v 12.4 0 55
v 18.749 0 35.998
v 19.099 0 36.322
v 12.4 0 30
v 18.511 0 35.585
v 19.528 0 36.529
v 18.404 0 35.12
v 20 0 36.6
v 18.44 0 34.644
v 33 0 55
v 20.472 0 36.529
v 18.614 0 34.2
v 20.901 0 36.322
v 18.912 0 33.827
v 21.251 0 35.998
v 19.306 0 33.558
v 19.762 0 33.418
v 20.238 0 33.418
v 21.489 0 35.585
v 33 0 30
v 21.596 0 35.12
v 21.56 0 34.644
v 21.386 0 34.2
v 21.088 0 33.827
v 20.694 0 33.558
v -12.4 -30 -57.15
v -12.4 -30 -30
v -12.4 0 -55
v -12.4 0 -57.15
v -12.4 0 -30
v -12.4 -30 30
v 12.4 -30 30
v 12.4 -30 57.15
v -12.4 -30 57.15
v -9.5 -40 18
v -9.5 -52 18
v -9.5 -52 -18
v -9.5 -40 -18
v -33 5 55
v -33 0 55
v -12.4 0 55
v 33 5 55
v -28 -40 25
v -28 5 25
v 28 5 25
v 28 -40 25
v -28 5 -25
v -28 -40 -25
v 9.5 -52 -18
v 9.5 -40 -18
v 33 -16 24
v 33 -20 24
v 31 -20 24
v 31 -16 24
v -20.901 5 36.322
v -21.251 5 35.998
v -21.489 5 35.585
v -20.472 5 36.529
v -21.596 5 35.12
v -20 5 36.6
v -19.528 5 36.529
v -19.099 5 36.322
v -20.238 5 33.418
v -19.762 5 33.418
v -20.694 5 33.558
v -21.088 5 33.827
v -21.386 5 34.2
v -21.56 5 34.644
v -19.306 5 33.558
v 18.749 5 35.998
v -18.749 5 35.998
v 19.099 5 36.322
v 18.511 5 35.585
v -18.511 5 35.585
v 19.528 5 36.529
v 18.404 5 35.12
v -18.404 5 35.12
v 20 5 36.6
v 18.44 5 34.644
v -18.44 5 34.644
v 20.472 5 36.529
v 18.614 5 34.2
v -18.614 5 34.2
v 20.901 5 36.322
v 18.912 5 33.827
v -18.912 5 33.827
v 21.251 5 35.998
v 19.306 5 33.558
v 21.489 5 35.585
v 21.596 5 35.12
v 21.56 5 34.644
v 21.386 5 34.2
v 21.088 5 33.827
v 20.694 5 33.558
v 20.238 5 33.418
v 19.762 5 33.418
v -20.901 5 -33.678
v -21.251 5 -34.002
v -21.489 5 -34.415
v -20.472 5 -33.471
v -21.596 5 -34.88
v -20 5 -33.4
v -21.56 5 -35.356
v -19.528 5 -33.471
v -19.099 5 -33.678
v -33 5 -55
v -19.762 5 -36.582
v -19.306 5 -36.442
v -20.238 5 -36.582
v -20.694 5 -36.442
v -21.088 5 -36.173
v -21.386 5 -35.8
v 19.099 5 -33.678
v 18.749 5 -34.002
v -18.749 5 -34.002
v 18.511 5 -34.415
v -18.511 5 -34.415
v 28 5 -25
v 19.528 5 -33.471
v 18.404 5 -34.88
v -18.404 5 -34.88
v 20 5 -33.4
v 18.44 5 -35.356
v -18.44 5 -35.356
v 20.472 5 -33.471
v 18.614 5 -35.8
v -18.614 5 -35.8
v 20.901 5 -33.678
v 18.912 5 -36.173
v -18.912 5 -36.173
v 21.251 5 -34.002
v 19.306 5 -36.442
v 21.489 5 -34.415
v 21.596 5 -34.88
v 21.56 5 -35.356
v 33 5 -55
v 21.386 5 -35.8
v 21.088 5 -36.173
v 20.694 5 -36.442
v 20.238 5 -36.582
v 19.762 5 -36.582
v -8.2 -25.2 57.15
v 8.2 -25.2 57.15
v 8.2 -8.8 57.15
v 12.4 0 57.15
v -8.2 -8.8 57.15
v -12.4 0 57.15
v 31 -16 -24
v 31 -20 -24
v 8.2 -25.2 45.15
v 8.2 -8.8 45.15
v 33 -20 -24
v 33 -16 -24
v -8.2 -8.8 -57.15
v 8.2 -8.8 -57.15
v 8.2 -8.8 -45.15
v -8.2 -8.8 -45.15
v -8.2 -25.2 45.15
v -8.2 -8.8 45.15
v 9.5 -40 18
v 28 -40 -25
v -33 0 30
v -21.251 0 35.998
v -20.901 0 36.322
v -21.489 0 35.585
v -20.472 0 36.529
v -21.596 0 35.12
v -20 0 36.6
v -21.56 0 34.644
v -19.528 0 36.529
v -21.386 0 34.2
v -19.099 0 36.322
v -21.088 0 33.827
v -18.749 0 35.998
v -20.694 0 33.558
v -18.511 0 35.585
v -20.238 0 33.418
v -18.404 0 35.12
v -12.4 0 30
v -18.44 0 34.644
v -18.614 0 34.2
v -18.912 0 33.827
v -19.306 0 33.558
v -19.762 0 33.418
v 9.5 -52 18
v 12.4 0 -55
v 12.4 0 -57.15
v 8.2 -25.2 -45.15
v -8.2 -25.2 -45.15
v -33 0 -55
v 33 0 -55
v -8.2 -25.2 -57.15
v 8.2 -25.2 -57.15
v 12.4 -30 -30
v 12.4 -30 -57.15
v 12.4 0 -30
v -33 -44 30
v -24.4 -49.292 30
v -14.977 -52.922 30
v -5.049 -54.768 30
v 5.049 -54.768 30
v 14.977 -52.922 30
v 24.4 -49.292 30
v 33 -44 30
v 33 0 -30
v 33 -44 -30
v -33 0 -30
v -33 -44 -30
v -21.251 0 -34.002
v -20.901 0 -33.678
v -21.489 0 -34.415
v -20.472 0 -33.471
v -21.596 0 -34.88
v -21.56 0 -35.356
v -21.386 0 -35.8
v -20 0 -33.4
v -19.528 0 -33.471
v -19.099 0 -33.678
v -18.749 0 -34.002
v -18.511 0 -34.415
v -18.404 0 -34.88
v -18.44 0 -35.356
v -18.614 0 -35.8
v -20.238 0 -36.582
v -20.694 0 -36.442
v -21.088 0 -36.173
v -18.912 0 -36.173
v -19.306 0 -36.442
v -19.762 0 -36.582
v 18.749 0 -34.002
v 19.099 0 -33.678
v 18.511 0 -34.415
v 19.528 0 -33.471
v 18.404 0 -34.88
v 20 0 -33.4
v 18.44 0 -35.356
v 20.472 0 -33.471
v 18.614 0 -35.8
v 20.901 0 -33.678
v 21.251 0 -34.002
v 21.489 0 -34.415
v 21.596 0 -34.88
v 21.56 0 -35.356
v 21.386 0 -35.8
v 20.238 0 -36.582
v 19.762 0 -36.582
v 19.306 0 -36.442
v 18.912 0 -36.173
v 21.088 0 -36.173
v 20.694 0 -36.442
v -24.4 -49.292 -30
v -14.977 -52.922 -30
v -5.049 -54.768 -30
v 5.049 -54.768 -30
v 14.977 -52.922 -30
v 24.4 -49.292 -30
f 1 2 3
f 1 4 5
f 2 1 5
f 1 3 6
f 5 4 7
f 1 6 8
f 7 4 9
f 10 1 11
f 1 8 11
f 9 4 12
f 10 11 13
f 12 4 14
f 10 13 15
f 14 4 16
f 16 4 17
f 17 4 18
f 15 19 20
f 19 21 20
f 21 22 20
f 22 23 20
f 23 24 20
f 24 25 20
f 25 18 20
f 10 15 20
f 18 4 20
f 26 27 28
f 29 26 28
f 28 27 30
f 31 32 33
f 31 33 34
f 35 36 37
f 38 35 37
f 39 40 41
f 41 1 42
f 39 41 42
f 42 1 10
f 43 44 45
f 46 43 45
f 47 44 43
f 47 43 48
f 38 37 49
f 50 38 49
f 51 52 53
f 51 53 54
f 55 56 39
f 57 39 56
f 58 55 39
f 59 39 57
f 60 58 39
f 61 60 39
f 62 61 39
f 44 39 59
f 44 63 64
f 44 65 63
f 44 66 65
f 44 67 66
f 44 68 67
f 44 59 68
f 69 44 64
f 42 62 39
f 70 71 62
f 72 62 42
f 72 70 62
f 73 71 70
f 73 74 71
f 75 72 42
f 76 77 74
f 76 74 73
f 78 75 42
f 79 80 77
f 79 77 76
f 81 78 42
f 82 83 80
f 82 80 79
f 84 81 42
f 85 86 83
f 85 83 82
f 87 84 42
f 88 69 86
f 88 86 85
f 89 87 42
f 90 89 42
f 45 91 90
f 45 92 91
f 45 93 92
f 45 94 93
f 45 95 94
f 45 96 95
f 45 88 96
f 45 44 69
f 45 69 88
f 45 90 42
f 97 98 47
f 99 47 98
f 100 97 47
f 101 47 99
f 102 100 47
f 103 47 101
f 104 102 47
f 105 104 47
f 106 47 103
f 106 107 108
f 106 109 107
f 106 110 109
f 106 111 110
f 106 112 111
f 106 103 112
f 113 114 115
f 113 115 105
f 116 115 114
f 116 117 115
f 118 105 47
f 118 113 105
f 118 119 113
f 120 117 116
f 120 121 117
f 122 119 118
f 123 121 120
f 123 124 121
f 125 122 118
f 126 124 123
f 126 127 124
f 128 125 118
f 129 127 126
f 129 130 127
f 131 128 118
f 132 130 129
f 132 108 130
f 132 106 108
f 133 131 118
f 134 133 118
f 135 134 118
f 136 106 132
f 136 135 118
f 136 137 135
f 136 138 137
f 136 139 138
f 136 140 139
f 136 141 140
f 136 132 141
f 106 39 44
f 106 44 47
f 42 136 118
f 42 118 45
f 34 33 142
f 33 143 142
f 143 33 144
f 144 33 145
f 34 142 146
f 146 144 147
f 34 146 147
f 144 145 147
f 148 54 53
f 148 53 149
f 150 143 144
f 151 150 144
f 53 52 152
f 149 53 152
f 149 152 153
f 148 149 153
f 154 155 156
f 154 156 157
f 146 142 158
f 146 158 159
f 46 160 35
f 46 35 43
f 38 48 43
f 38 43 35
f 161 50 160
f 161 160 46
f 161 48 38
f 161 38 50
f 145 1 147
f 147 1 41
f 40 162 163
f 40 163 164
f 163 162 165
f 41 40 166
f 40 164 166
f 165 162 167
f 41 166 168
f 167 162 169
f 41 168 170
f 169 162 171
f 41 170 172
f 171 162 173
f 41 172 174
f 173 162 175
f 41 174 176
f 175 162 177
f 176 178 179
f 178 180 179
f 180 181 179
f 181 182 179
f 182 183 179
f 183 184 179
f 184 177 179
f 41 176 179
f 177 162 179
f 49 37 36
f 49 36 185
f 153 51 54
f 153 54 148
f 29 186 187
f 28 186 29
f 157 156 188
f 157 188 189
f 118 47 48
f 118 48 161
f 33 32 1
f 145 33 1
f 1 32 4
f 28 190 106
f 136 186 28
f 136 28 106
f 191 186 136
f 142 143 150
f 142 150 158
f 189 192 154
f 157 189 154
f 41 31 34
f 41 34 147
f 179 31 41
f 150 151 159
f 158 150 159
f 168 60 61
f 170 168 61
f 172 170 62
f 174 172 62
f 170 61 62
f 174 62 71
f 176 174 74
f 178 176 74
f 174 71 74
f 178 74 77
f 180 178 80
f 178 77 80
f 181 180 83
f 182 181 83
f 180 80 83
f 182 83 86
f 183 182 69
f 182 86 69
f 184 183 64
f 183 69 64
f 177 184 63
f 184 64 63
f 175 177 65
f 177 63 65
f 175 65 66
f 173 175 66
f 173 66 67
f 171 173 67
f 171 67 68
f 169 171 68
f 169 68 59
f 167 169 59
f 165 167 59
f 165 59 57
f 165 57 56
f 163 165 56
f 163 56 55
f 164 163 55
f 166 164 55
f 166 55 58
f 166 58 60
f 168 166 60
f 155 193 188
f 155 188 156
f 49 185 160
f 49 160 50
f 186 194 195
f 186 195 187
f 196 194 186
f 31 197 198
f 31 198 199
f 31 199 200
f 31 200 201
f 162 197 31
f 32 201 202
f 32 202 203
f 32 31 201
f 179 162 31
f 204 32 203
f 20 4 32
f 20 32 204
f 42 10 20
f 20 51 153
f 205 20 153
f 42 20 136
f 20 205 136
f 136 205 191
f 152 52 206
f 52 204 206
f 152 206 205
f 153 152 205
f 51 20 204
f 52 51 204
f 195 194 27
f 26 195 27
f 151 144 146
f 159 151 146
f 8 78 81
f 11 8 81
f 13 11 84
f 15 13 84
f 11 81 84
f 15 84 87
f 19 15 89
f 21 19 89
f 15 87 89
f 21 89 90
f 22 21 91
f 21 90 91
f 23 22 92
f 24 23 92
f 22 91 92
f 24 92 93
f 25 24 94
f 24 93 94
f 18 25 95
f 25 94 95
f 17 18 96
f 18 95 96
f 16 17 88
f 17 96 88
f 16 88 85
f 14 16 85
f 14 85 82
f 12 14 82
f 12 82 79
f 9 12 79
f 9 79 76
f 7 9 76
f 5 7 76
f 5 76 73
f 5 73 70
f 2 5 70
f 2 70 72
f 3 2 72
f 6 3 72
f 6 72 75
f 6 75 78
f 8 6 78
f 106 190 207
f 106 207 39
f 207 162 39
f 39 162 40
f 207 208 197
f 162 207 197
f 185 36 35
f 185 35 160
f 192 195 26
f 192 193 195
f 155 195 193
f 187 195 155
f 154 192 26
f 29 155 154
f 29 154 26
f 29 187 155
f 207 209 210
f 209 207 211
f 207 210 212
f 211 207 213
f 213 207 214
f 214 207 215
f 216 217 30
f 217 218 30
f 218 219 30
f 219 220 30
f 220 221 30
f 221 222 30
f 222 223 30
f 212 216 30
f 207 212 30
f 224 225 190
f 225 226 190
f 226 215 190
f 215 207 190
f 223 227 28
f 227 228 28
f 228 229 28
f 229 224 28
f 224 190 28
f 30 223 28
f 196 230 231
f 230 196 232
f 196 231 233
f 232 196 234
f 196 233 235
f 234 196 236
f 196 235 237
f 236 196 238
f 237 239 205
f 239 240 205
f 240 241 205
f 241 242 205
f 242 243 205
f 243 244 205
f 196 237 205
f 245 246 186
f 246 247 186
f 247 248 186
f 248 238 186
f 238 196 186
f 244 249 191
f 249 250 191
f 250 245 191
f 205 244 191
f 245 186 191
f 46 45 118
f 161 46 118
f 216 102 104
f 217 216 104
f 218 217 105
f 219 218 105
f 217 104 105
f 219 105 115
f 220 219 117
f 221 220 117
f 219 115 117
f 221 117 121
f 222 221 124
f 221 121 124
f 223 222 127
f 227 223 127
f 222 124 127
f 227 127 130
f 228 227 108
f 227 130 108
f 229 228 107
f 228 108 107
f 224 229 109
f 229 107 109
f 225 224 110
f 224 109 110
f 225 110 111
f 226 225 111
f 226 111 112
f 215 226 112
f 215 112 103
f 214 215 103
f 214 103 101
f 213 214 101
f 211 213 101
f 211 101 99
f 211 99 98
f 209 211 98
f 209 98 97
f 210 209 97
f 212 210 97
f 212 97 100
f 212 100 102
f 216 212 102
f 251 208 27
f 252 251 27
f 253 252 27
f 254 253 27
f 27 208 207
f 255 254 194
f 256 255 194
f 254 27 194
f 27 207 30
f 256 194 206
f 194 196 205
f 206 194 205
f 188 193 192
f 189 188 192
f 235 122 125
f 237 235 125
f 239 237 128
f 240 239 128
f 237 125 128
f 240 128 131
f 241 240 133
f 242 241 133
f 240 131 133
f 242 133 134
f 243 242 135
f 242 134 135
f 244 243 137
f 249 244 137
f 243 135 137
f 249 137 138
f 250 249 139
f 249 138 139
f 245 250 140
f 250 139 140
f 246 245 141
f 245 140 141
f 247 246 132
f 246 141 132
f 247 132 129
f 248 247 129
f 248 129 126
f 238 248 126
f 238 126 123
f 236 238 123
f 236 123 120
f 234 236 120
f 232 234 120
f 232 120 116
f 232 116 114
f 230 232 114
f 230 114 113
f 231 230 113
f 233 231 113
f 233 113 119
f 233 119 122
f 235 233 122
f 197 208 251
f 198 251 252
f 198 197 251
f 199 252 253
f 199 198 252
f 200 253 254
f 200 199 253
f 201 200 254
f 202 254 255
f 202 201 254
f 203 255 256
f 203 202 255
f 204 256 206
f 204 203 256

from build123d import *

# Parameters (mm, degrees)
BOSS_EXTRUDE1_DEPTH      = 30
BOSS_EXTRUDE1_DEPTH_BACK = 30
CUT_EXTRUDE1_DEPTH       = 18
CUT_EXTRUDE1_DEPTH_BACK  = 18
SKETCH2_W                = 19
SKETCH2_H                = 52
SKETCH3_W                = 21.854352608
SKETCH3_H                = 45
CUT_EXTRUDE2_DEPTH       = 99.234413522
SKETCH4_R                = 1.6
CUT_EXTRUDE3_DEPTH       = 84.366660003
SKETCH6_W                = 48
SKETCH6_H                = 4
CUT_EXTRUDE5_DEPTH       = 2
SKETCH9_W                = 22
SKETCH9_H                = 60
CUT_EXTRUDE7_DEPTH       = 84.366660003
SKETCH10_W               = 66
SKETCH10_H               = 110
SKETCH10_W_2             = 19
SKETCH10_H_2             = 36
BOSS_EXTRUDE2_DEPTH      = 5
SKETCH11_R               = 1.6
CUT_EXTRUDE8_DEPTH       = 88.82938005
SKETCH13_W               = 24.8
SKETCH13_H               = 30
BOSS_EXTRUDE3_DEPTH      = 27.15
SKETCH14_W               = 16.4
SKETCH14_H               = 16.4
CUT_EXTRUDE9_DEPTH       = 12
SKETCH15_W               = 56
SKETCH15_H               = 50
CUT_EXTRUDE10_DEPTH      = 45


with BuildPart() as part:
    # Sketch1 → Boss-Extrude1 (new, two sides: drawn at the far end of the back side and taken through both)
    with BuildSketch(Plane.XY.offset(-BOSS_EXTRUDE1_DEPTH_BACK)):
        with BuildLine():
            Line((55, 0), (0, 0))
            Line((0, 0), (-55, 0))
            ThreePointArc((-55, 0), (0, -55), (55, 0))
        make_face()
    extrude(amount=BOSS_EXTRUDE1_DEPTH + BOSS_EXTRUDE1_DEPTH_BACK)

    # Sketch2 → Cut-Extrude1 (cut, two sides: drawn at the far end of the back side and taken through both)
    with BuildSketch(Plane.XY.offset(-CUT_EXTRUDE1_DEPTH_BACK)):
        with Locations((0, -26)):
            Rectangle(SKETCH2_W, SKETCH2_H)
    extrude(amount=CUT_EXTRUDE1_DEPTH + CUT_EXTRUDE1_DEPTH_BACK, mode=Mode.SUBTRACT)

    # Sketch3 → Cut-Extrude2 (cut, through all)
    with BuildSketch(Plane.XY.offset(30)):
        with Locations((-43.927176304, -26.5)):
            Rectangle(SKETCH3_W, SKETCH3_H)
        with Locations((43.927176304, -26.5)):
            Rectangle(SKETCH3_W, SKETCH3_H)
    extrude(amount=-CUT_EXTRUDE2_DEPTH, mode=Mode.SUBTRACT)

    # Sketch4 → Cut-Extrude3 (cut, through all)
    with BuildSketch(Plane(origin=(0, 0, 0), x_dir=(1, 0, 0), z_dir=(0, 1, 0))):
        with Locations((45, 20)):
            Circle(SKETCH4_R)
        with Locations((45, -20)):
            Circle(SKETCH4_R)
        with Locations((-45, -20)):
            Circle(SKETCH4_R)
        with Locations((-45, 20)):
            Circle(SKETCH4_R)
    extrude(amount=-CUT_EXTRUDE3_DEPTH, mode=Mode.SUBTRACT)

    # Sketch6 → Cut-Extrude5 (cut)
    with BuildSketch(Plane(origin=(33, 0, 0), x_dir=(0, 0, -1), z_dir=(1, 0, 0))):
        with Locations((0, -18)):
            Rectangle(SKETCH6_W, SKETCH6_H)
    extrude(amount=-CUT_EXTRUDE5_DEPTH, mode=Mode.SUBTRACT)

    # Sketch9 → Cut-Extrude7 (cut, through all)
    with BuildSketch(Plane(origin=(0, 0, 0), x_dir=(1, 0, 0), z_dir=(0, 1, 0))):
        with Locations((-44, 0)):
            Rectangle(SKETCH9_W, SKETCH9_H)
        with Locations((44, 0)):
            Rectangle(SKETCH9_W, SKETCH9_H)
    extrude(amount=-CUT_EXTRUDE7_DEPTH, mode=Mode.SUBTRACT)

    # Sketch10 → Boss-Extrude2 (add)
    with BuildSketch(Plane(origin=(0, 0, 0), x_dir=(1, 0, 0), z_dir=(0, 1, 0))):
        Rectangle(SKETCH10_W, SKETCH10_H)
        Rectangle(SKETCH10_W_2, SKETCH10_H_2, mode=Mode.SUBTRACT)
    extrude(amount=BOSS_EXTRUDE2_DEPTH)

    # Sketch11 → Cut-Extrude8 (cut, through all)
    with BuildSketch(Plane(origin=(0, 5, 0), x_dir=(1, 0, 0), z_dir=(0, 1, 0))):
        with Locations((-20, 35)):
            Circle(SKETCH11_R)
        with Locations((20, 35)):
            Circle(SKETCH11_R)
        with Locations((-20, -35)):
            Circle(SKETCH11_R)
        with Locations((20, -35)):
            Circle(SKETCH11_R)
    extrude(amount=-CUT_EXTRUDE8_DEPTH, mode=Mode.SUBTRACT)

    # Sketch13 → Boss-Extrude3 (add)
    with BuildSketch(Plane(origin=(0, 0, -30), x_dir=(-1, 0, 0), z_dir=(0, 0, -1))):
        with Locations((0, -15)):
            Rectangle(SKETCH13_W, SKETCH13_H)
    boss_extrude3 = extrude(amount=BOSS_EXTRUDE3_DEPTH)

    # Sketch14 → Cut-Extrude9 (cut)
    with BuildSketch(Plane(origin=(0, 0, -57.15), x_dir=(-1, 0, 0), z_dir=(0, 0, -1))):
        with Locations((0, -17)):
            Rectangle(SKETCH14_W, SKETCH14_H)
    cut_extrude9 = extrude(amount=-CUT_EXTRUDE9_DEPTH, mode=Mode.SUBTRACT)

    # Mirror2: Boss-Extrude3 across plane
    add(boss_extrude3.mirror(Plane(origin=(0, 0, 0), x_dir=(1, 0, 0), z_dir=(0, 0, -1))))

    # Mirror3: Cut-Extrude9 across plane
    add(cut_extrude9.mirror(Plane(origin=(0, 0, 0), x_dir=(1, 0, 0), z_dir=(0, 0, -1))), mode=Mode.SUBTRACT)

    # Sketch15 → Cut-Extrude10 (cut)
    with BuildSketch(Plane(origin=(0, 5, 0), x_dir=(1, 0, 0), z_dir=(0, 1, 0))):
        Rectangle(SKETCH15_W, SKETCH15_H)
    extrude(amount=-CUT_EXTRUDE10_DEPTH, mode=Mode.SUBTRACT)


solid = part.part
